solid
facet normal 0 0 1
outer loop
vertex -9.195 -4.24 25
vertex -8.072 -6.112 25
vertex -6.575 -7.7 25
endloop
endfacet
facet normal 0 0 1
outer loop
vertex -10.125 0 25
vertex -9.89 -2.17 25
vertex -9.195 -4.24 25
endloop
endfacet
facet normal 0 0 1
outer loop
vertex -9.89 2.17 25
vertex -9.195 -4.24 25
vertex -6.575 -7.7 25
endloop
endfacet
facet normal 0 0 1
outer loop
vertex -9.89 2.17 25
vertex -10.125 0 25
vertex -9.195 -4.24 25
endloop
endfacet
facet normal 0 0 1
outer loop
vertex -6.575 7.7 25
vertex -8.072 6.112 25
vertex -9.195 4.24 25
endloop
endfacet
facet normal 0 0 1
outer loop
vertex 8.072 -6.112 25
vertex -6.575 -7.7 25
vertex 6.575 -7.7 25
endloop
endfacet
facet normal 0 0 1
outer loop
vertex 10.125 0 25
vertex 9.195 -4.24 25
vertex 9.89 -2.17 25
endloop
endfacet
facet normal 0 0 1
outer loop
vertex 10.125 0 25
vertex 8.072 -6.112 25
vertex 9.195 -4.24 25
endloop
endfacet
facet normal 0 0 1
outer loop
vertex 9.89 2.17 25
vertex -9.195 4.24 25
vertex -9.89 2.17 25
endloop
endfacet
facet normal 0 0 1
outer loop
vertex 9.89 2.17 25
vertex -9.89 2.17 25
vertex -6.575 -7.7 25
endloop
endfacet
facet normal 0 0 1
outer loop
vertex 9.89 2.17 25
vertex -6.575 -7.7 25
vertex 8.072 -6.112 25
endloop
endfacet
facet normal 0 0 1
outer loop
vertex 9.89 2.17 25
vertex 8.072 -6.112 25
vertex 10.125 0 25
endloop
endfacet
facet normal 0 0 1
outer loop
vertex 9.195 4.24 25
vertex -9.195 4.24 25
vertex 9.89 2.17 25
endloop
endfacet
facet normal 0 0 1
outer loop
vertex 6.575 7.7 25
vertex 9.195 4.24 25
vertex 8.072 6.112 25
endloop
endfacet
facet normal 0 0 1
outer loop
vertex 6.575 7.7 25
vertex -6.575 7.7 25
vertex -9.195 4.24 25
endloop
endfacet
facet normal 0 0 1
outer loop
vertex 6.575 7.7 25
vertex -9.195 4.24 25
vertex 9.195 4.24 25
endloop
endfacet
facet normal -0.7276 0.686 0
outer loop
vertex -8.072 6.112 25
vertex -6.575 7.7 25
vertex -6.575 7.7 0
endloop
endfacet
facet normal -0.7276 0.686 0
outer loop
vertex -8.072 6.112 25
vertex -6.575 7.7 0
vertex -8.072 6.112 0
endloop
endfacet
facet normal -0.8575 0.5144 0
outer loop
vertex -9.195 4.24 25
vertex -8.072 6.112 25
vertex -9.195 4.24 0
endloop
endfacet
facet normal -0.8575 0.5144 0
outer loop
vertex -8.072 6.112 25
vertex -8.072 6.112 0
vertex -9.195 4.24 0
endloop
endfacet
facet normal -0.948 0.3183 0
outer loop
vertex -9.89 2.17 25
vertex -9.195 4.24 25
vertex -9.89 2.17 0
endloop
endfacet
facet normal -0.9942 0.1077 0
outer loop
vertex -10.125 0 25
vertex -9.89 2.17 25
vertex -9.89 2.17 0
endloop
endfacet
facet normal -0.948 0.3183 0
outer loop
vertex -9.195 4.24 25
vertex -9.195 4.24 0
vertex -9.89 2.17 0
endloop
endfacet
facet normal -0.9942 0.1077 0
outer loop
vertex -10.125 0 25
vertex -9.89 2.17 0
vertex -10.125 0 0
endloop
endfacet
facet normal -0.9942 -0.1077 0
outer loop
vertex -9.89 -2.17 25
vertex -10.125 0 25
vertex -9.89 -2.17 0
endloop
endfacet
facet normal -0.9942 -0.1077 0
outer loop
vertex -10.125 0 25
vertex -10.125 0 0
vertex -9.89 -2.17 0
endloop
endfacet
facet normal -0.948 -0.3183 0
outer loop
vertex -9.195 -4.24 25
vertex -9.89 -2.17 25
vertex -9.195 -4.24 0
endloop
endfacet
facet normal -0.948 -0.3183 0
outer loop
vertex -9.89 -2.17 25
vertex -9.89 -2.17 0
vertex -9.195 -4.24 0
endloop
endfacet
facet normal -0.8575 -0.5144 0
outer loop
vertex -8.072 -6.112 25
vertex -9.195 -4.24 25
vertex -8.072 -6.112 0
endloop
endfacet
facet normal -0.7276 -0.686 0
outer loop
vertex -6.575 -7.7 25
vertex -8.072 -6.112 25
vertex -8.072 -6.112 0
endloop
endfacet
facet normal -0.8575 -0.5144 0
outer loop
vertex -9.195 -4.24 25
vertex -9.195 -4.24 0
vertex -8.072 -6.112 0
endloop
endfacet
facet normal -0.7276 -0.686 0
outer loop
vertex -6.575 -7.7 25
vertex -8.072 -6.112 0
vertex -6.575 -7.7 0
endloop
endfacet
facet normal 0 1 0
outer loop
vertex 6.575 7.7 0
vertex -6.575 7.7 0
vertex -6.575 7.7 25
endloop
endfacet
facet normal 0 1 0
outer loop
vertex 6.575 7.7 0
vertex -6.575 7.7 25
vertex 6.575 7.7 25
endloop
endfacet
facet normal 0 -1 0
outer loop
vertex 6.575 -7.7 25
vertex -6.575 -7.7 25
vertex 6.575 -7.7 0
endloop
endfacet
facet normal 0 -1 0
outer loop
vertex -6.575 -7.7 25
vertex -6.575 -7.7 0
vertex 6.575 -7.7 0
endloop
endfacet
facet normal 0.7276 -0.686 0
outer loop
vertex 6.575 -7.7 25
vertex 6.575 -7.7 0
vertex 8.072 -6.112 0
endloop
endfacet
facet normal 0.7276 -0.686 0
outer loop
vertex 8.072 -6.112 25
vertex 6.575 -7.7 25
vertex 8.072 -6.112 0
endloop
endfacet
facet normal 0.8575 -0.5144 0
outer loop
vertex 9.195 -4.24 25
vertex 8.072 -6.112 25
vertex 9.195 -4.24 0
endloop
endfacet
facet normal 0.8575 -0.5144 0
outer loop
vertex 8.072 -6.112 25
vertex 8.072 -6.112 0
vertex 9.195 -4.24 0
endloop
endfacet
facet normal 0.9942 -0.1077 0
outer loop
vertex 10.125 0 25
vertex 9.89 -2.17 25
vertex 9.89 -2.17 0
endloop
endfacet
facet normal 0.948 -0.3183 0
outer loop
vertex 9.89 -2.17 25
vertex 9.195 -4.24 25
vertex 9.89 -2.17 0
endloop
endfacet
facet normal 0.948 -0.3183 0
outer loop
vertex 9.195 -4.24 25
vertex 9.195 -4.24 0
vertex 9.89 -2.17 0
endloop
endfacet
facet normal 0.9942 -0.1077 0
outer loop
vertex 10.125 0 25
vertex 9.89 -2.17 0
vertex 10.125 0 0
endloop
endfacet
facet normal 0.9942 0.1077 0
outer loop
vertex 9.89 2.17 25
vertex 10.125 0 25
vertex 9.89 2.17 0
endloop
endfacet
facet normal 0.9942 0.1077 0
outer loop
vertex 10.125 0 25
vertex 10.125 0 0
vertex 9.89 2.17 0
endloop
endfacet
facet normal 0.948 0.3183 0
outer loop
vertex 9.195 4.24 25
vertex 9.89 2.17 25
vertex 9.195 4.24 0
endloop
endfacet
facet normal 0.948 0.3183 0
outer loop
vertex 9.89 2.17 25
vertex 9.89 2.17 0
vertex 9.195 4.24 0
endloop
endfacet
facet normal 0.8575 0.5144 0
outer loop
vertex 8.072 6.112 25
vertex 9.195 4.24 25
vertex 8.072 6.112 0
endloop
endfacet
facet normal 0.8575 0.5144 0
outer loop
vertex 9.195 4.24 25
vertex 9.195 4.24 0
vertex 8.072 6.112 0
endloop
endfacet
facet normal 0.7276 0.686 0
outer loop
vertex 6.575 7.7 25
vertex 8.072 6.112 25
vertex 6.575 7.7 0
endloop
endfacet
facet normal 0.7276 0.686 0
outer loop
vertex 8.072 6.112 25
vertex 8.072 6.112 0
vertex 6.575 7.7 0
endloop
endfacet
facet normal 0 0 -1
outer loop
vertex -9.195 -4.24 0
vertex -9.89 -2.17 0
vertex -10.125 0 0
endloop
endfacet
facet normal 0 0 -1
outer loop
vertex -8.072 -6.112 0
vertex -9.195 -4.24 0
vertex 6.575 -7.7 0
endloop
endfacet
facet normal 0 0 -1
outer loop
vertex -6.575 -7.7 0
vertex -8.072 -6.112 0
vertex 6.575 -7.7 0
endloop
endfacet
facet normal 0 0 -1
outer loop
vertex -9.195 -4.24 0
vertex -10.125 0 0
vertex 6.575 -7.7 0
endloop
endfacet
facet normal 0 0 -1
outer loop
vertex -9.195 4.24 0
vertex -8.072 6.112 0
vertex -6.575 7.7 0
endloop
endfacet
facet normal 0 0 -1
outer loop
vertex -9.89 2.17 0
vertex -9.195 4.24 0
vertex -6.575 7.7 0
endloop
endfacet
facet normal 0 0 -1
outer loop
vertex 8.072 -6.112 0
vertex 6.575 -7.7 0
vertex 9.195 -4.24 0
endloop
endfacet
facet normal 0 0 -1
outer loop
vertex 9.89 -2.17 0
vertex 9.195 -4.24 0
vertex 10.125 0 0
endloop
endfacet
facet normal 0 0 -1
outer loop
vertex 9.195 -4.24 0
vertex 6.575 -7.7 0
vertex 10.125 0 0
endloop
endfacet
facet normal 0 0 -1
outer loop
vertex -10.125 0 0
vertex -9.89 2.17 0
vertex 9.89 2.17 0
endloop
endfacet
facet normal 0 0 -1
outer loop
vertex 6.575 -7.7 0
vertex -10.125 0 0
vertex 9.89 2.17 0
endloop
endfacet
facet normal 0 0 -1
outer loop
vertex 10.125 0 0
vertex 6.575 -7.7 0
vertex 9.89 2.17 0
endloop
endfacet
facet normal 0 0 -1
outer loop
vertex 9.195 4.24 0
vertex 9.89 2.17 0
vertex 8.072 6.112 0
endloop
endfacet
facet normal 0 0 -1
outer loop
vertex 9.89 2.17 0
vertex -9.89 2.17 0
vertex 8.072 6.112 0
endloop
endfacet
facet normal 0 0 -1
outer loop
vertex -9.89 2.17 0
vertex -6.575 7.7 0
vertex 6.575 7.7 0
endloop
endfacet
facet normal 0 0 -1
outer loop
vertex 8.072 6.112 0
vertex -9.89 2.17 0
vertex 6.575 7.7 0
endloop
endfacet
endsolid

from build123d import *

# Parameters (mm, degrees)
BOX_W          = 25
BOX_H          = 10
BOX_DEPTH      = 30
CYLINDER_R     = 10.125
CYLINDER_DEPTH = 25


with BuildPart() as cubo_caras_planas_motor:
    # Box → Box (new body)
    with BuildSketch(Plane(origin=(-12.5, 7.7, -3), x_dir=(1, 0, 0), z_dir=(0, 0, 1))):
        with Locations((12.5, 5)):
            Rectangle(BOX_W, BOX_H)
    extrude(amount=BOX_DEPTH)


with BuildPart() as fusion_prismas_caras_planas:
    # Part__Mirroring: instance of Cubo caras planas motor
    add(cubo_caras_planas_motor.part.mirror(Plane(origin=(0, 0, 0), x_dir=(1, 0, 0), z_dir=(0, 1, 0))))

    # Fusion: union Cubo caras planas motor
    add(cubo_caras_planas_motor.part)


with BuildPart() as master_cuerpo_motor_con_offset_0_2_mm:
    # Cylinder → Cylinder (new body)
    with BuildSketch(Plane.XY):
        Circle(CYLINDER_R)
    extrude(amount=CYLINDER_DEPTH)

    # Cut: cut Fusion prismas caras planas
    add(fusion_prismas_caras_planas.part, mode=Mode.SUBTRACT)


solid = master_cuerpo_motor_con_offset_0_2_mm.part
